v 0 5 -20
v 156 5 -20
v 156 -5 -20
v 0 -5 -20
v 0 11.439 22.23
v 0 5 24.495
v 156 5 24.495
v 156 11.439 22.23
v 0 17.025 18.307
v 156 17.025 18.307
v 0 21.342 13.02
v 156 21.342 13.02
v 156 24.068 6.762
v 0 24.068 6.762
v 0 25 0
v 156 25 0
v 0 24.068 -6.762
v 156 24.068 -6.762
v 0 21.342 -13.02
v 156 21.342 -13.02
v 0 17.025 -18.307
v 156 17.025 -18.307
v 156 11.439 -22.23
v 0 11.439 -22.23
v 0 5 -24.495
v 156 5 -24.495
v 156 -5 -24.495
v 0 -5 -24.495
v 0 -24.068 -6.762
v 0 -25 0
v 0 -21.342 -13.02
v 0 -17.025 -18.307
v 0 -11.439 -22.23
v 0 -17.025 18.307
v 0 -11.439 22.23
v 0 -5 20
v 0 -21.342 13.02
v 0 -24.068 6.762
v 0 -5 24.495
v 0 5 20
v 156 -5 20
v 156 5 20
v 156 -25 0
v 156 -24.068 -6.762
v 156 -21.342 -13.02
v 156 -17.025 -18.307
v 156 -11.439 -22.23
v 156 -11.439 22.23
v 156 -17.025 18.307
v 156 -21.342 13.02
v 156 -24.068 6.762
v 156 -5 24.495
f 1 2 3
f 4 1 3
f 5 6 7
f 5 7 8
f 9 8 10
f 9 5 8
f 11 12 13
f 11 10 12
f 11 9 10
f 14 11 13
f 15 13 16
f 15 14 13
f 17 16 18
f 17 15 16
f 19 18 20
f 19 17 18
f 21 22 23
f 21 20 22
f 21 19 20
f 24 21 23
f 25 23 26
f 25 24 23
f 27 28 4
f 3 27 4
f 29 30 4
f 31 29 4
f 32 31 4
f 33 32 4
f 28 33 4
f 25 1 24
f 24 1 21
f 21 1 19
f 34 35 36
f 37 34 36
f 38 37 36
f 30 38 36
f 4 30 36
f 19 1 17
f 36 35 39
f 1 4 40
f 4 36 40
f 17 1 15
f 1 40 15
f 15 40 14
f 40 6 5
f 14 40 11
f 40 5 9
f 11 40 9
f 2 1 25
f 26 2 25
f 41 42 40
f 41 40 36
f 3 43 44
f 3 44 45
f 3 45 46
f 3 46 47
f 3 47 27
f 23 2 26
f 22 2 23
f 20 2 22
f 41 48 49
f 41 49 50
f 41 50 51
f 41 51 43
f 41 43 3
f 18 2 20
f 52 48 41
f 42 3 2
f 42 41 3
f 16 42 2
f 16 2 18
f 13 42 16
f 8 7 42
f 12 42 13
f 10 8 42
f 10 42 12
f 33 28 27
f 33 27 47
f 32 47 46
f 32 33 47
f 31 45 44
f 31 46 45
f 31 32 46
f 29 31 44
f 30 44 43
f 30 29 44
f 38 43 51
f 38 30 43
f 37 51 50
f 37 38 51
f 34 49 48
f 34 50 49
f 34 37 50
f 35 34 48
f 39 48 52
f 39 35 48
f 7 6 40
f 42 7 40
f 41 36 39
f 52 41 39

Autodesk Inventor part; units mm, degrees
ref_plane "YZ Plane" through (0, 0, 0) normal (1, 0, 0) x (0, 1, 0)
ref_plane "XZ Plane" through (0, 0, 0) normal (0, 1, 0) x (-1, 0, 0)
ref_plane "XY Plane" through (0, 0, 0) normal (0, 0, 1) x (1, 0, 0)
sketch "Sketch1" plane through (0, 0, 0) normal (1, 0, 0) x (0, 1, 0)
  line L0 (5, 20) -> (-5, 20)
  line L1 (5, -20) -> (-5, -20)
  arc A0 (5, -24.4949) -> (5, 24.4949) centre (0, 0) ccw
  arc A1 (-5, 24.4949) -> (-5, -24.4949) centre (0, 0) ccw
  line L2 (5, 24.4949) -> (5, 20)
  line L3 (5, -20) -> (5, -24.4949)
  line L4 (-5, -24.4949) -> (-5, -20)
  line L5 (-5, 20) -> (-5, 24.4949)
  dimension "d3" = 20
  dimension "d4" = 40
  dimension "d7" = 25
  dimension "d8" = 25
  dimension "d9" = 10
extrude "Extrusion1" add sketch "Sketch1" along normal blind 156
properties part number "SpinnerAxelV1"
